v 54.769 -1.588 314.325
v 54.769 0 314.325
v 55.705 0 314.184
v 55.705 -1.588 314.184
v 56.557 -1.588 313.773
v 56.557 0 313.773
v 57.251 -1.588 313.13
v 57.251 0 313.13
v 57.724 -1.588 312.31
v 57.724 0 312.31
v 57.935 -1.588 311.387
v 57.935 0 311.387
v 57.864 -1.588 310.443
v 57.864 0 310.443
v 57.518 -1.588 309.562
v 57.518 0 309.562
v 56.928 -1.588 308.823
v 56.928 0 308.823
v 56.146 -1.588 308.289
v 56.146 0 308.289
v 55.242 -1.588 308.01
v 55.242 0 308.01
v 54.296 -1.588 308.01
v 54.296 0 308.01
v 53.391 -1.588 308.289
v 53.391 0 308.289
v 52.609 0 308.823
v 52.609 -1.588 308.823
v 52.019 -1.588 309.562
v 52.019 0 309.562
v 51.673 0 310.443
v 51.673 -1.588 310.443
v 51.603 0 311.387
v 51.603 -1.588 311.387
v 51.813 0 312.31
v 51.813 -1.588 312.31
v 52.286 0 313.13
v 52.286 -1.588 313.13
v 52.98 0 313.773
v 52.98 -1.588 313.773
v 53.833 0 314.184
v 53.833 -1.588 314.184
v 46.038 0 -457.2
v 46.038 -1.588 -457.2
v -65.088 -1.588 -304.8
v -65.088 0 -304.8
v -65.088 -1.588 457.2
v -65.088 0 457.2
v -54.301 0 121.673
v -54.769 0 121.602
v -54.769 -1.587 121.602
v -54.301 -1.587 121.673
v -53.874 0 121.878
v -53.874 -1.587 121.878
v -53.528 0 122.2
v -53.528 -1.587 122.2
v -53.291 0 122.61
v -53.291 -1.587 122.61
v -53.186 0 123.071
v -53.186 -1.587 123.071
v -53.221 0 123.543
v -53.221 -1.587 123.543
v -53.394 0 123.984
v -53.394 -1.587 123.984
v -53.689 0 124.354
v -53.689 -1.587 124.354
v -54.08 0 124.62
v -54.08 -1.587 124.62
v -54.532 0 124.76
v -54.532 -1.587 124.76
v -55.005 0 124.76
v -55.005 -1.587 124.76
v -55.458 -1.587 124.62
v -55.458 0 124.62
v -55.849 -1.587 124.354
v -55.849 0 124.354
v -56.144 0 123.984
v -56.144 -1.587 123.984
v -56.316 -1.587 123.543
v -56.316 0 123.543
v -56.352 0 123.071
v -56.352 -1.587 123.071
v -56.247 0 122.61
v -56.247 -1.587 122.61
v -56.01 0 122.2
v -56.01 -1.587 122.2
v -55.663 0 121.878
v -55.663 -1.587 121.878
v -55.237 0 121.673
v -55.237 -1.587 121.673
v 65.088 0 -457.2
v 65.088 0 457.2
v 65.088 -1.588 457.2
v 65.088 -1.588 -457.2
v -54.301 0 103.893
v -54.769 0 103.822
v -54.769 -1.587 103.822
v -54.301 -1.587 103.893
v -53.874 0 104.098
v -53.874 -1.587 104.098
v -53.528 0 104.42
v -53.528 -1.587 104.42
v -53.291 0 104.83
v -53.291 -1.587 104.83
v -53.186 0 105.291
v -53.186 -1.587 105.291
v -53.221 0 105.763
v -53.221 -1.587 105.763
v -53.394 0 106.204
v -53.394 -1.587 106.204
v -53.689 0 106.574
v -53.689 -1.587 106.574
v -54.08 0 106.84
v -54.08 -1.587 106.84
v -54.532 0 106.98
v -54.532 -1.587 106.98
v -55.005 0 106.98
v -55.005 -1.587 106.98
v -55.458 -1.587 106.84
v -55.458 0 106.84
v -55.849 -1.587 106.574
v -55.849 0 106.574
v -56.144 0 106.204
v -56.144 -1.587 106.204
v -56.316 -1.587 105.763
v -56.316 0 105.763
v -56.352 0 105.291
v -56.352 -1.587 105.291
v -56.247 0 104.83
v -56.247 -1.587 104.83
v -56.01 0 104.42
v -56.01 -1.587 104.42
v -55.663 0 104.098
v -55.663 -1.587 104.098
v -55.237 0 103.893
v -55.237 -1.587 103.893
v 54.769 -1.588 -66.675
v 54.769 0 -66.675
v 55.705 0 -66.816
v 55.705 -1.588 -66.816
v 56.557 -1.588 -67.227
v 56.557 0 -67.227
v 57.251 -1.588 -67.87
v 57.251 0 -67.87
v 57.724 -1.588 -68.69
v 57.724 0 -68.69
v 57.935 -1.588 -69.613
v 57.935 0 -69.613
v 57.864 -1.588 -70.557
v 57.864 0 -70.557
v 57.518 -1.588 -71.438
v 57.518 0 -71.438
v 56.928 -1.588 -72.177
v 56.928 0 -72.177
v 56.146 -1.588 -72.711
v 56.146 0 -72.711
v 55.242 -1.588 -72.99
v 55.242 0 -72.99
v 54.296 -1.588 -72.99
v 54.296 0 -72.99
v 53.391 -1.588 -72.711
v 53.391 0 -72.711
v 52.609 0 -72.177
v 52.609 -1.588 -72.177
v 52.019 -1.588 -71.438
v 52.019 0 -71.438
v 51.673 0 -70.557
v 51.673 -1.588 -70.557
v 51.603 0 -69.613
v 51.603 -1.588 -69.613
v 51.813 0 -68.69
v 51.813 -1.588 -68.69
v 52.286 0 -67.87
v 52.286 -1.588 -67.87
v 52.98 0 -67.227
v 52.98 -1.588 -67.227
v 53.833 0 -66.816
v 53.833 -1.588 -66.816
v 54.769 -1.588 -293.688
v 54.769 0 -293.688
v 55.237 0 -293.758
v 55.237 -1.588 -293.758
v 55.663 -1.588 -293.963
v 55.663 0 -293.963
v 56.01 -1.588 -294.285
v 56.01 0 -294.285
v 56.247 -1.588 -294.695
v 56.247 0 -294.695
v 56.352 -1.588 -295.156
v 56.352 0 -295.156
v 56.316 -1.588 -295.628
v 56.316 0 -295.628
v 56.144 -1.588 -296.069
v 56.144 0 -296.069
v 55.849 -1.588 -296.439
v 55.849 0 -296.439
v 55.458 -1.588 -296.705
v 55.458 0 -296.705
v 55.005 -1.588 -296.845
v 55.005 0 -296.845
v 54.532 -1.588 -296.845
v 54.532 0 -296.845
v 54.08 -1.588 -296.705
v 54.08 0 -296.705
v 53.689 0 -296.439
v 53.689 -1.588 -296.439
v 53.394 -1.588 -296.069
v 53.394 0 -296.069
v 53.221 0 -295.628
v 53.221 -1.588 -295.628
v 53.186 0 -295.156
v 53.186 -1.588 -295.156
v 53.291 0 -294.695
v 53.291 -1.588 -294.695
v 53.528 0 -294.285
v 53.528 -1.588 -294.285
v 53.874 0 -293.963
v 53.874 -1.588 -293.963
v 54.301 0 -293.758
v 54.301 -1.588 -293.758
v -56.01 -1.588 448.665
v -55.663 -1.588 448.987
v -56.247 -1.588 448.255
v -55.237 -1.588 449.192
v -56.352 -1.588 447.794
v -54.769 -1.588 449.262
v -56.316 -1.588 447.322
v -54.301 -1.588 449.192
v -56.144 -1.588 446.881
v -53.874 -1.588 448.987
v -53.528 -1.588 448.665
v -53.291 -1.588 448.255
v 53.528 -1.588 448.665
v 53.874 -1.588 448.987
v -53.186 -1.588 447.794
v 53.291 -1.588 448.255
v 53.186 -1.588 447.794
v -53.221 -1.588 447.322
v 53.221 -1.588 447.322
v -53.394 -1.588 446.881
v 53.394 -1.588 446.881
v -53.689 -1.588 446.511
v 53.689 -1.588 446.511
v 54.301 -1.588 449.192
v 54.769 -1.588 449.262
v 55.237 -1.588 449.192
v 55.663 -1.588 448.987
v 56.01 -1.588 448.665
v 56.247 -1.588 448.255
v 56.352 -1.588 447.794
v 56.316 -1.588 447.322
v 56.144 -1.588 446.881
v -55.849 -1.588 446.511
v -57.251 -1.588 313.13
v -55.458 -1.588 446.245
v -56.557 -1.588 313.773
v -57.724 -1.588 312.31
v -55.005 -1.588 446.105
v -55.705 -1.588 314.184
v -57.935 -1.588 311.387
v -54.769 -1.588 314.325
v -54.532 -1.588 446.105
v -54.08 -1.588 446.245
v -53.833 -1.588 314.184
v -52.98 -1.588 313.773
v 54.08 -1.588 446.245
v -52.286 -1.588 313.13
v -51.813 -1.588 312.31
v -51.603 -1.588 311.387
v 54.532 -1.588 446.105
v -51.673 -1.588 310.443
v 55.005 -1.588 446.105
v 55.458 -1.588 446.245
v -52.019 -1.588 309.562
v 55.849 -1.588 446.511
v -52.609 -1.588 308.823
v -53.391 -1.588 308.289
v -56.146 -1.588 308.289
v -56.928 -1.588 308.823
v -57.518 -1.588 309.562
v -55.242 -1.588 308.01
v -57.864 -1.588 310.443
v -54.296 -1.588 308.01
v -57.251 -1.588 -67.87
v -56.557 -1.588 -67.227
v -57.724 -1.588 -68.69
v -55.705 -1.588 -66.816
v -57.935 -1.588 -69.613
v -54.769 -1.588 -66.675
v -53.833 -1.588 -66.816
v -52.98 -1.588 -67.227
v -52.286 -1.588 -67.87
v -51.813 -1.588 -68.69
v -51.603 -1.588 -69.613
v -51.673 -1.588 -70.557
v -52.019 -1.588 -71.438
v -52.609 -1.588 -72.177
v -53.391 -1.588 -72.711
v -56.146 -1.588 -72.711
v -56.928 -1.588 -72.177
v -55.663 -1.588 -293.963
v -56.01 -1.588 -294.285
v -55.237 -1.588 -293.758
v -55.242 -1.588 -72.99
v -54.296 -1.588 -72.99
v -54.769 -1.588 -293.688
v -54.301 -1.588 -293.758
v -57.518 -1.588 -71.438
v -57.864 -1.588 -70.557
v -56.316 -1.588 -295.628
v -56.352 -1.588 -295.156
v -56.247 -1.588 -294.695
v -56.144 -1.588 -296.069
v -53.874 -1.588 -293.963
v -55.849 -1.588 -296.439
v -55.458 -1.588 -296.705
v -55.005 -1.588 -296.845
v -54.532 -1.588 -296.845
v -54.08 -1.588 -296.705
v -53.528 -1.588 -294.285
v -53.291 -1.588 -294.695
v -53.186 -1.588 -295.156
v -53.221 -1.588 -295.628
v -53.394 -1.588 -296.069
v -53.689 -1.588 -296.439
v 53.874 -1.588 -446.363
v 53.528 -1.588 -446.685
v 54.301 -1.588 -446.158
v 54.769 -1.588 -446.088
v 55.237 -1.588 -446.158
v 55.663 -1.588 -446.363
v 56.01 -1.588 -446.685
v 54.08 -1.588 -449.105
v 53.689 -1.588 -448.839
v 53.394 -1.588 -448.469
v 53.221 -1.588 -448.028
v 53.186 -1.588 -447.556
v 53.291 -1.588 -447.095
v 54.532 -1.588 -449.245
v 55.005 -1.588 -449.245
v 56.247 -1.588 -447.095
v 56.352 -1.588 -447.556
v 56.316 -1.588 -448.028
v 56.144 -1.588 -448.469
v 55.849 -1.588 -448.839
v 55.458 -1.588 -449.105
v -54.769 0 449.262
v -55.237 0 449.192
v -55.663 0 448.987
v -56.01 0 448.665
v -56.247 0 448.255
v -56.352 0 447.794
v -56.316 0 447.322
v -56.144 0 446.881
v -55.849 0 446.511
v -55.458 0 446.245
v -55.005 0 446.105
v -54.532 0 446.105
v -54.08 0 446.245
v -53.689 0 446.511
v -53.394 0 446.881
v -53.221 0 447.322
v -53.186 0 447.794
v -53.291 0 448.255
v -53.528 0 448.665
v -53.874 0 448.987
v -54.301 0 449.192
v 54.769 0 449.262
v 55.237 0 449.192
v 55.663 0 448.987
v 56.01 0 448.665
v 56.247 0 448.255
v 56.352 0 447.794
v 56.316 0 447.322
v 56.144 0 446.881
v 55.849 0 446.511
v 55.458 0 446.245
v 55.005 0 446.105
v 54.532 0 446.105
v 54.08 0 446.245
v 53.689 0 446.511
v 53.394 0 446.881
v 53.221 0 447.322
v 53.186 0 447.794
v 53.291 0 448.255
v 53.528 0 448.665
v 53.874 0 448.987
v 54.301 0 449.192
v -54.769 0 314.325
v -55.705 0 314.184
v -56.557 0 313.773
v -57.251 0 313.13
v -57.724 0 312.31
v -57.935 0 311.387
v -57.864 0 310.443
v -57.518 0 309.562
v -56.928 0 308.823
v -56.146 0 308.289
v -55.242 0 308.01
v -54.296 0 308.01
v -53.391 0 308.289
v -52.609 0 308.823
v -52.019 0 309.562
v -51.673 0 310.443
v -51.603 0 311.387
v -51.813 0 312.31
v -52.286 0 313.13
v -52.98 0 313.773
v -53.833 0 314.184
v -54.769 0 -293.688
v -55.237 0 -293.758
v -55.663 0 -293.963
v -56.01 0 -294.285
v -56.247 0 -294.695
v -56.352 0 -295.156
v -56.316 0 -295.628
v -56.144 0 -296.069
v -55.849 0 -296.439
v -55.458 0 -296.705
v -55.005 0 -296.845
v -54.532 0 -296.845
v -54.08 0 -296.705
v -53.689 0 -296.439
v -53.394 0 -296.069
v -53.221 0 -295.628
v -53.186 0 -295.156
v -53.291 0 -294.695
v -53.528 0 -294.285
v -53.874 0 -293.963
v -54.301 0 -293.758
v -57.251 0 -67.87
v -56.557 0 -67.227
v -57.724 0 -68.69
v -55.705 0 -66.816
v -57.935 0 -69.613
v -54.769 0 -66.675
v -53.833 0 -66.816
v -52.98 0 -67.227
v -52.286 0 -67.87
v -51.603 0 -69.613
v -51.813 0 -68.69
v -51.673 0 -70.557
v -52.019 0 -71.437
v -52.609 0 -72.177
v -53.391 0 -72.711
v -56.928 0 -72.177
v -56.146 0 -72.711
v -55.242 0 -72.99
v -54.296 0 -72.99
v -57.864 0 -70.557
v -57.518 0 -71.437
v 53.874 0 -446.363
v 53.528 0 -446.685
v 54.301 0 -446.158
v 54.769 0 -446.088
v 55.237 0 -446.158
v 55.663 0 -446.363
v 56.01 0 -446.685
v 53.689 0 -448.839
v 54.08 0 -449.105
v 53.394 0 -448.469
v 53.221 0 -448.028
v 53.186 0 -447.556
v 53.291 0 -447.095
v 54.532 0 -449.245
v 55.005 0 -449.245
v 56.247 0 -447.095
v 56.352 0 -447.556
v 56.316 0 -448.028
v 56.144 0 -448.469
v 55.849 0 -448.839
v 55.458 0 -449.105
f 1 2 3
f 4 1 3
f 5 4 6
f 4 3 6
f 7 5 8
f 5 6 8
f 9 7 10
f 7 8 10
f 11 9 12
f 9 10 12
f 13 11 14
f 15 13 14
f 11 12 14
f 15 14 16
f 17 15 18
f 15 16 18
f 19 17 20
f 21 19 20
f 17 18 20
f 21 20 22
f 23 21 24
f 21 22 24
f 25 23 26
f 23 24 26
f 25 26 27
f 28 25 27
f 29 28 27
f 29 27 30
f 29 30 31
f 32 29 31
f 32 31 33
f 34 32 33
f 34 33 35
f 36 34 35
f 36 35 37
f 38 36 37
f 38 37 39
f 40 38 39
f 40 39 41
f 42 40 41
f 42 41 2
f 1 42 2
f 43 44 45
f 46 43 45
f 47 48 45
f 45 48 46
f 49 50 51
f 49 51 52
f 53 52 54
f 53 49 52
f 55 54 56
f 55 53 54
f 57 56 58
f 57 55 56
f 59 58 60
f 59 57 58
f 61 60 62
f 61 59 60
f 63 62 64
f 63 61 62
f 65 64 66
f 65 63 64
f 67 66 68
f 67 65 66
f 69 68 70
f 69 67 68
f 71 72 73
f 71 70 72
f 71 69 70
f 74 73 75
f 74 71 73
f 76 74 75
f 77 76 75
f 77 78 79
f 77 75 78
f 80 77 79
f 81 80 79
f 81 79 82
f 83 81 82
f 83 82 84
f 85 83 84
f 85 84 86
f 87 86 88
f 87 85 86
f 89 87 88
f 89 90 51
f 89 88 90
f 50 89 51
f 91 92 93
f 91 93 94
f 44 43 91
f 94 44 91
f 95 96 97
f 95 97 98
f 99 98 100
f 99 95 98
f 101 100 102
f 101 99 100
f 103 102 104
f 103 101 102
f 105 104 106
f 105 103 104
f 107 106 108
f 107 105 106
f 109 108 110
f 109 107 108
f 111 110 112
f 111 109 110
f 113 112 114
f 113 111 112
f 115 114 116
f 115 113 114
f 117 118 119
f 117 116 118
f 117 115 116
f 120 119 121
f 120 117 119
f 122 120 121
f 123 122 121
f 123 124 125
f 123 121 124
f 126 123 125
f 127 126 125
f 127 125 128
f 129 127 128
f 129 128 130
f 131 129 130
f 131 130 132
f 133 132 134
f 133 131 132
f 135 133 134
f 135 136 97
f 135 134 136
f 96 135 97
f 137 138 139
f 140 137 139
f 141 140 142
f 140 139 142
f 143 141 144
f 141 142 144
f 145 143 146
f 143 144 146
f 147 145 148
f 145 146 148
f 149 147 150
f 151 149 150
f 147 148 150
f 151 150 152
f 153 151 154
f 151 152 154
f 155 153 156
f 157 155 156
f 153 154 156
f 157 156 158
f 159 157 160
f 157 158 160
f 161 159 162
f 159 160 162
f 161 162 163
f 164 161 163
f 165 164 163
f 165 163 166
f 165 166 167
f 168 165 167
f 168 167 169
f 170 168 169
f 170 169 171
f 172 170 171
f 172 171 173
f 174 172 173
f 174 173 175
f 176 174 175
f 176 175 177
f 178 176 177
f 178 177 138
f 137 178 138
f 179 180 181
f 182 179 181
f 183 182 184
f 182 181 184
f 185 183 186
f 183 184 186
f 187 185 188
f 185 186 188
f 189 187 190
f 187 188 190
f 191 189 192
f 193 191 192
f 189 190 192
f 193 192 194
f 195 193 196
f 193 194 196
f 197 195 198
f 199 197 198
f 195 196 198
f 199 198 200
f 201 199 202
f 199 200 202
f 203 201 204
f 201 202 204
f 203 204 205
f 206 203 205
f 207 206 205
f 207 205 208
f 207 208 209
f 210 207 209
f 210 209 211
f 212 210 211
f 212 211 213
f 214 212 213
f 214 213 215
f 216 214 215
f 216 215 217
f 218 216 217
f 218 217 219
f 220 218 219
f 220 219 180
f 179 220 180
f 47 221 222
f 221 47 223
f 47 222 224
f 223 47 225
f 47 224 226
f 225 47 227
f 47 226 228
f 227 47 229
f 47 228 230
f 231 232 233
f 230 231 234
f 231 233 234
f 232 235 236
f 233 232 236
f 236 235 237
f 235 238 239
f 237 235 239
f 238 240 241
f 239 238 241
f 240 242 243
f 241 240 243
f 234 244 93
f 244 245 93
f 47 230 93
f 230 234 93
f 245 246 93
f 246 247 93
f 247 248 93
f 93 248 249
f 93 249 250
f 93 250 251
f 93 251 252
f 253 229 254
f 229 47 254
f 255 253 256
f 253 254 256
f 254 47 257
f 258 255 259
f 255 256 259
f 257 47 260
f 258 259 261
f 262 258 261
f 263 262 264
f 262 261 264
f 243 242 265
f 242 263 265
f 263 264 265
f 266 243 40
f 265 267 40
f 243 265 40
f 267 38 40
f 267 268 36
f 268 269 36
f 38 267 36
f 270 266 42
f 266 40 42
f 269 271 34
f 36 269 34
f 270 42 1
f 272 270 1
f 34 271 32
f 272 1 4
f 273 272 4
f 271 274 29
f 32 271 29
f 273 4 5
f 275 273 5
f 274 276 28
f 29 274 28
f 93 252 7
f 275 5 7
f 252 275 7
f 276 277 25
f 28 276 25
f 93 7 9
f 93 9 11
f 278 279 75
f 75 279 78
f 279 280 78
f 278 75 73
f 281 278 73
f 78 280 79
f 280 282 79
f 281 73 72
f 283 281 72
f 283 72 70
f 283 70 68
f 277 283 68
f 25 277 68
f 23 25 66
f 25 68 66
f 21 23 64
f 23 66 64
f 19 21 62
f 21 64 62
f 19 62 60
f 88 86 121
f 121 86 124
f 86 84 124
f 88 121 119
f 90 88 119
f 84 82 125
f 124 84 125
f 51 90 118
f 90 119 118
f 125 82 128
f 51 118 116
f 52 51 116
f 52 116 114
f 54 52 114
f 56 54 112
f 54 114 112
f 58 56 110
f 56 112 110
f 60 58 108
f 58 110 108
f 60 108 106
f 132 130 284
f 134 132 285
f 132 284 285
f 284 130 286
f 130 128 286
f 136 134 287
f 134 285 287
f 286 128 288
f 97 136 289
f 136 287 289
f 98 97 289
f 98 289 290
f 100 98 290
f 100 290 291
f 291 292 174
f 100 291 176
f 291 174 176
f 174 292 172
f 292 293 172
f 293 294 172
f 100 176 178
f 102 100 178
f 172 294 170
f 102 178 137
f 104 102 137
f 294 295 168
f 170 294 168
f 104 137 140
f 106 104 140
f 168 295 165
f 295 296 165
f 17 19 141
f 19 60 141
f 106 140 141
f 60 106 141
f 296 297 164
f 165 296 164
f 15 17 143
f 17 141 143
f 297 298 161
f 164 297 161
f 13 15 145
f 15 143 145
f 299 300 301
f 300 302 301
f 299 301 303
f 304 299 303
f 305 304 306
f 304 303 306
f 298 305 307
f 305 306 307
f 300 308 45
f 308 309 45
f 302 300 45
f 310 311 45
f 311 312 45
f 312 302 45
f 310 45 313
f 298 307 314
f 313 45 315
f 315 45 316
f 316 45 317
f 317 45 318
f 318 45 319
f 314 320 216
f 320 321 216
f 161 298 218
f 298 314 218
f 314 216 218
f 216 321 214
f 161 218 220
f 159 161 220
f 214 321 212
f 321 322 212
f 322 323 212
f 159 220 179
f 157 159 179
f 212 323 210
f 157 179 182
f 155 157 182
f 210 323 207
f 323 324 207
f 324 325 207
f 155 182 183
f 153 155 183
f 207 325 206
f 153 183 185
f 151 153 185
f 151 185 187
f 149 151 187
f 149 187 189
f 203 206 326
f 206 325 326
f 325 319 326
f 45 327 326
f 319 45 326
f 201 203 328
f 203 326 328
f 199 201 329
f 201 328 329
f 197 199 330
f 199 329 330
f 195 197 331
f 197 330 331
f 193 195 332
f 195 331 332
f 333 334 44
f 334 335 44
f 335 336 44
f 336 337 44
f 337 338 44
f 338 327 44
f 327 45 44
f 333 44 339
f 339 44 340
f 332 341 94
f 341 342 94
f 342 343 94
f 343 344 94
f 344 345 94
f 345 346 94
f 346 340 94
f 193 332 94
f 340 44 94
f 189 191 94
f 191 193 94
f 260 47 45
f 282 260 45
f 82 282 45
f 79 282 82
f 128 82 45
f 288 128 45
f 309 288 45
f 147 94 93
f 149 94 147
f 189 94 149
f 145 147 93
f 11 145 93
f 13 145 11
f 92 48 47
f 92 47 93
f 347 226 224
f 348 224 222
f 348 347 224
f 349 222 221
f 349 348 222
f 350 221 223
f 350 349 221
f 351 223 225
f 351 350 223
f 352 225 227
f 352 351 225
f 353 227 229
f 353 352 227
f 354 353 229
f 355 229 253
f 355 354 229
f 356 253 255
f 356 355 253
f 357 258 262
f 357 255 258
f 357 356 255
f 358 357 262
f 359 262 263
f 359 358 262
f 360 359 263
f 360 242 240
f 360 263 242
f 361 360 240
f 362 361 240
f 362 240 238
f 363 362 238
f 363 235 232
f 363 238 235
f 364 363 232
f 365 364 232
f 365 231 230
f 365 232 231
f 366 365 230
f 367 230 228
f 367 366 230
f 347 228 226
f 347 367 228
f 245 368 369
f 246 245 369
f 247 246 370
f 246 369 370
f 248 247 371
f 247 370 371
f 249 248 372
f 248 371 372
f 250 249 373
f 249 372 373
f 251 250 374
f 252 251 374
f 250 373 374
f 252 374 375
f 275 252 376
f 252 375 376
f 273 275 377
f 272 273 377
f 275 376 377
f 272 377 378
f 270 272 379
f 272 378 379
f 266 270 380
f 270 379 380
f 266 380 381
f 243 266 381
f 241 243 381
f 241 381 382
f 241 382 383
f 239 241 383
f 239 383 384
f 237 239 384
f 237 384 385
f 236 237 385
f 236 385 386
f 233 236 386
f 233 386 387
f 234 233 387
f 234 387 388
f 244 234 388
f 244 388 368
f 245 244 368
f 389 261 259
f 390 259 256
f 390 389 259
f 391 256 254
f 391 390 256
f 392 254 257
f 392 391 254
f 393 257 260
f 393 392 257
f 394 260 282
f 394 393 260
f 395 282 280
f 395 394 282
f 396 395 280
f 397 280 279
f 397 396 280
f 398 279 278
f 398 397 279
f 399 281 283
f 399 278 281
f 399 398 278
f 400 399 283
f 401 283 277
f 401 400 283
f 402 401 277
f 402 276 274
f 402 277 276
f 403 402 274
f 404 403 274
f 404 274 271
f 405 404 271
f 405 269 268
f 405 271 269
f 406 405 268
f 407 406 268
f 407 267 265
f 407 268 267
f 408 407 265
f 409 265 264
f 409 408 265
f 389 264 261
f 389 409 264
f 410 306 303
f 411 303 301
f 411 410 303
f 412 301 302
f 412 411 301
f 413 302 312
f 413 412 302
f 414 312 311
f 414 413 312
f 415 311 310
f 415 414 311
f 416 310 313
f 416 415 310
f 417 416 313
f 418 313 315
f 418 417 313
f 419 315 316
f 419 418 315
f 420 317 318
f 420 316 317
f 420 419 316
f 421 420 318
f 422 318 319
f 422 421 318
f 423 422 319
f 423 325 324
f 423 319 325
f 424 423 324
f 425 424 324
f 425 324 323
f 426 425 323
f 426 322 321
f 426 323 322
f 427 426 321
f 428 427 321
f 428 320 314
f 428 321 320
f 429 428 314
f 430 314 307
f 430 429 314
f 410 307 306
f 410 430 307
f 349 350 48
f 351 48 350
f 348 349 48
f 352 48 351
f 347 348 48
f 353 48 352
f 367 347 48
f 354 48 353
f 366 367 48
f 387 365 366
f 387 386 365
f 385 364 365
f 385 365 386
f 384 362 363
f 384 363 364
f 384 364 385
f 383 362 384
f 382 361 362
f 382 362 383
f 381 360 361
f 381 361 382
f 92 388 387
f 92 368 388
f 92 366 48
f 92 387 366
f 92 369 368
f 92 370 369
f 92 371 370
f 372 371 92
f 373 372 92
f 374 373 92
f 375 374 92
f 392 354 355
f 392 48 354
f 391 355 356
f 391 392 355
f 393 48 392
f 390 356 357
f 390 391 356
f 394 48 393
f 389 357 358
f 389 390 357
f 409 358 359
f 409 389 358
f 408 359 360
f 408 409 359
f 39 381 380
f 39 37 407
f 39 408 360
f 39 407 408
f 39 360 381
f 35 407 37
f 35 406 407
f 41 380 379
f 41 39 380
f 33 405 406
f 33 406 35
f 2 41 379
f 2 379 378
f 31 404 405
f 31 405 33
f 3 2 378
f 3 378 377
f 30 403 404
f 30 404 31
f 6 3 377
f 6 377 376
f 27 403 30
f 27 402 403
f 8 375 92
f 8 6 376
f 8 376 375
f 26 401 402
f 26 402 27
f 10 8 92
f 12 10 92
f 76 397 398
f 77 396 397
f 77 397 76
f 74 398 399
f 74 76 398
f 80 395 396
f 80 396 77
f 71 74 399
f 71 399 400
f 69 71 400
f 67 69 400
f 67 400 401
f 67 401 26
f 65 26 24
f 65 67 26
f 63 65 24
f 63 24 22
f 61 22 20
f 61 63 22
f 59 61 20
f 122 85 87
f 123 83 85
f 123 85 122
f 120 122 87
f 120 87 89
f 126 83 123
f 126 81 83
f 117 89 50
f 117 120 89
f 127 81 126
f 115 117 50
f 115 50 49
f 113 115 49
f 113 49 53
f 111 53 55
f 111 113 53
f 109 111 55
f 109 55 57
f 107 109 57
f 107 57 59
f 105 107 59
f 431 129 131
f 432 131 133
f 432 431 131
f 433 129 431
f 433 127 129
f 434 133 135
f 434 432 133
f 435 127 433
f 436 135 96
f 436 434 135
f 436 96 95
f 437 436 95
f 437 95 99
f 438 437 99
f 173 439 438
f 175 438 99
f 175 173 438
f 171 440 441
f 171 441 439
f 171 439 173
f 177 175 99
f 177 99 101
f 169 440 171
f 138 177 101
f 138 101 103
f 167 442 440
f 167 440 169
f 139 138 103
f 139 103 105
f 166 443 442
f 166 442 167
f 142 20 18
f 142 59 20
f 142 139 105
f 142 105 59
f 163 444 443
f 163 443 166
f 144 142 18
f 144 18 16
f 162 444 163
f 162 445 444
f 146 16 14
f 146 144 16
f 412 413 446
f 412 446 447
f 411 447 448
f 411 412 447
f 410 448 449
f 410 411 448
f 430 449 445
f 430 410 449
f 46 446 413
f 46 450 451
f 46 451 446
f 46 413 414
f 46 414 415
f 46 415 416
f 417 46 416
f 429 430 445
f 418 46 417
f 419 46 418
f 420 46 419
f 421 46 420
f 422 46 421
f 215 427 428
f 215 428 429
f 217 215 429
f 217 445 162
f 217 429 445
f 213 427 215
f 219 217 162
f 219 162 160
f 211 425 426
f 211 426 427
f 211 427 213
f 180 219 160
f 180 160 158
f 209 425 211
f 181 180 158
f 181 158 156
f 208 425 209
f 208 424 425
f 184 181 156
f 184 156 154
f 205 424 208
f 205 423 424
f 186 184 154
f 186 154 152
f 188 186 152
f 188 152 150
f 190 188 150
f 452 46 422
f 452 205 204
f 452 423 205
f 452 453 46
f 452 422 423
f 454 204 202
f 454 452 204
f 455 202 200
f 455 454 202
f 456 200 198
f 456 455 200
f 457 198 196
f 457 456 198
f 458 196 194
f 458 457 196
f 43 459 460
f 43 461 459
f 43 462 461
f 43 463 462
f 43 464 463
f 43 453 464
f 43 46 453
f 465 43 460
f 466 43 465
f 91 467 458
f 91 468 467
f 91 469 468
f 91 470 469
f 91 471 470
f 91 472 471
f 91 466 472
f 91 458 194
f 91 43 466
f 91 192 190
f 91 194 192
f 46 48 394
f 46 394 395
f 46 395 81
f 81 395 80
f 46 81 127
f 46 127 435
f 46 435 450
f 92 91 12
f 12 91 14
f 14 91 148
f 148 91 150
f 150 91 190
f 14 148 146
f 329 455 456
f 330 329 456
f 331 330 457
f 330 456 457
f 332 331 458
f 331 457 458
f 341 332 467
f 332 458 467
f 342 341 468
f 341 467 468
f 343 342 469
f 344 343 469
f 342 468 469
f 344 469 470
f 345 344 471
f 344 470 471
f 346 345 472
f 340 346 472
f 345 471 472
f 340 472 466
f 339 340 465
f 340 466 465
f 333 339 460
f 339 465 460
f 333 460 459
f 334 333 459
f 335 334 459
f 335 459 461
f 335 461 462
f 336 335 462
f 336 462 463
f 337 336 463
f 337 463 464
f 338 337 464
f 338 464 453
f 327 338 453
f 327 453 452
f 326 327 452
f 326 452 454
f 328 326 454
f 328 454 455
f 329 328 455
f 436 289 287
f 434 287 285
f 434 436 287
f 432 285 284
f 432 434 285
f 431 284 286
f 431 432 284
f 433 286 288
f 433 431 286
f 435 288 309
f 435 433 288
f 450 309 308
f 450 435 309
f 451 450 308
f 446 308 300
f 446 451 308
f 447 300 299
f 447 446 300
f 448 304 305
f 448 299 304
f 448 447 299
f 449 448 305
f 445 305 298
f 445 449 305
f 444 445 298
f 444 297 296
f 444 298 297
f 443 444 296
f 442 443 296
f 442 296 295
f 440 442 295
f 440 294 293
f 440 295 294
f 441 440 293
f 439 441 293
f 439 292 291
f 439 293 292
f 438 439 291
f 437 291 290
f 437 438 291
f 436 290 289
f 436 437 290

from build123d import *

# Parameters (mm, degrees)
SKETCH1_W                     = 130.175
SKETCH1_H                     = 914.4
BOSS_EXTRUDE1_DEPTH           = 1.5875
SKETCH2_R                     = 1.5875
SKETCH2_R_2                   = 3.175
CUT_EXTRUDE2_DEPTH            = 462.812454155
SKETCH3_R                     = 1.5875
CUT_EXTRUDE3_DEPTH            = 462.812454155
STRUTMOUNTINGHOLES_DEPTH      = 462.812454155
STRUTMOUNTINGHOLES_DEPTH_BACK = 462.812454155
SKETCH5_R                     = 1.5875


with BuildPart() as part:
    # Sketch1 → Boss-Extrude1 (new body)
    with BuildSketch(Plane(origin=(0, 0, 0), x_dir=(1, 0, 0), z_dir=(0, 1, 0))):
        Rectangle(SKETCH1_W, SKETCH1_H)
    extrude(amount=-BOSS_EXTRUDE1_DEPTH)

    # Sketch2 → Cut-Extrude2 (cut, through all)
    with BuildSketch(Plane(origin=(0, 0, 0), x_dir=(1, 0, 0), z_dir=(0, 1, 0))):
        with Locations(Location((54.76875, -447.675, 0), (0, 0, 270))):
            Circle(SKETCH2_R)
        with Locations(Location((54.76875, -311.15, 0), (0, 0, 270))):
            Circle(SKETCH2_R_2)
        with Locations(Location((54.76875, 447.675, 0), (0, 0, 270))):
            Circle(SKETCH2_R)
        with Locations(Location((54.76875, 69.85, 0), (0, 0, 270))):
            Circle(SKETCH2_R_2)
        with Locations(Location((54.76875, 295.275, 0), (0, 0, 270))):
            Circle(SKETCH2_R)
    cut_extrude2 = extrude(amount=-CUT_EXTRUDE2_DEPTH, mode=Mode.SUBTRACT)

    # Mirror2: Cut-Extrude2 across plane
    add(cut_extrude2.mirror(Plane.ZY), mode=Mode.SUBTRACT)

    # Sketch3 → Cut-Extrude3 (cut, through all)
    with BuildSketch(Plane.XZ.offset(1.5875)):
        Polygon((-65.0875, -457.2), (46.0375, -457.2), (-65.0875, -304.8), align=None)
        with Locations((-54.76875, -447.675)):
            Circle(SKETCH3_R, mode=Mode.SUBTRACT)
    extrude(amount=-CUT_EXTRUDE3_DEPTH, mode=Mode.SUBTRACT)

    # Sketch5 → StrutMountingHoles (cut, two sides: drawn at the far end of the back side and taken through both)
    with BuildSketch(Plane(origin=(0, -1.5875, 0), x_dir=(-1, 0, 0), z_dir=(0, -1, 0)).offset(-STRUTMOUNTINGHOLES_DEPTH_BACK)):
        with Locations(Location((54.76875, -123.19, 0), (0, 0, 90))):
            Circle(SKETCH5_R)
        with Locations(Location((54.76875, -105.41, 0), (0, 0, 90))):
            Circle(SKETCH5_R)
    extrude(amount=STRUTMOUNTINGHOLES_DEPTH + STRUTMOUNTINGHOLES_DEPTH_BACK, mode=Mode.SUBTRACT)


solid = part.part
